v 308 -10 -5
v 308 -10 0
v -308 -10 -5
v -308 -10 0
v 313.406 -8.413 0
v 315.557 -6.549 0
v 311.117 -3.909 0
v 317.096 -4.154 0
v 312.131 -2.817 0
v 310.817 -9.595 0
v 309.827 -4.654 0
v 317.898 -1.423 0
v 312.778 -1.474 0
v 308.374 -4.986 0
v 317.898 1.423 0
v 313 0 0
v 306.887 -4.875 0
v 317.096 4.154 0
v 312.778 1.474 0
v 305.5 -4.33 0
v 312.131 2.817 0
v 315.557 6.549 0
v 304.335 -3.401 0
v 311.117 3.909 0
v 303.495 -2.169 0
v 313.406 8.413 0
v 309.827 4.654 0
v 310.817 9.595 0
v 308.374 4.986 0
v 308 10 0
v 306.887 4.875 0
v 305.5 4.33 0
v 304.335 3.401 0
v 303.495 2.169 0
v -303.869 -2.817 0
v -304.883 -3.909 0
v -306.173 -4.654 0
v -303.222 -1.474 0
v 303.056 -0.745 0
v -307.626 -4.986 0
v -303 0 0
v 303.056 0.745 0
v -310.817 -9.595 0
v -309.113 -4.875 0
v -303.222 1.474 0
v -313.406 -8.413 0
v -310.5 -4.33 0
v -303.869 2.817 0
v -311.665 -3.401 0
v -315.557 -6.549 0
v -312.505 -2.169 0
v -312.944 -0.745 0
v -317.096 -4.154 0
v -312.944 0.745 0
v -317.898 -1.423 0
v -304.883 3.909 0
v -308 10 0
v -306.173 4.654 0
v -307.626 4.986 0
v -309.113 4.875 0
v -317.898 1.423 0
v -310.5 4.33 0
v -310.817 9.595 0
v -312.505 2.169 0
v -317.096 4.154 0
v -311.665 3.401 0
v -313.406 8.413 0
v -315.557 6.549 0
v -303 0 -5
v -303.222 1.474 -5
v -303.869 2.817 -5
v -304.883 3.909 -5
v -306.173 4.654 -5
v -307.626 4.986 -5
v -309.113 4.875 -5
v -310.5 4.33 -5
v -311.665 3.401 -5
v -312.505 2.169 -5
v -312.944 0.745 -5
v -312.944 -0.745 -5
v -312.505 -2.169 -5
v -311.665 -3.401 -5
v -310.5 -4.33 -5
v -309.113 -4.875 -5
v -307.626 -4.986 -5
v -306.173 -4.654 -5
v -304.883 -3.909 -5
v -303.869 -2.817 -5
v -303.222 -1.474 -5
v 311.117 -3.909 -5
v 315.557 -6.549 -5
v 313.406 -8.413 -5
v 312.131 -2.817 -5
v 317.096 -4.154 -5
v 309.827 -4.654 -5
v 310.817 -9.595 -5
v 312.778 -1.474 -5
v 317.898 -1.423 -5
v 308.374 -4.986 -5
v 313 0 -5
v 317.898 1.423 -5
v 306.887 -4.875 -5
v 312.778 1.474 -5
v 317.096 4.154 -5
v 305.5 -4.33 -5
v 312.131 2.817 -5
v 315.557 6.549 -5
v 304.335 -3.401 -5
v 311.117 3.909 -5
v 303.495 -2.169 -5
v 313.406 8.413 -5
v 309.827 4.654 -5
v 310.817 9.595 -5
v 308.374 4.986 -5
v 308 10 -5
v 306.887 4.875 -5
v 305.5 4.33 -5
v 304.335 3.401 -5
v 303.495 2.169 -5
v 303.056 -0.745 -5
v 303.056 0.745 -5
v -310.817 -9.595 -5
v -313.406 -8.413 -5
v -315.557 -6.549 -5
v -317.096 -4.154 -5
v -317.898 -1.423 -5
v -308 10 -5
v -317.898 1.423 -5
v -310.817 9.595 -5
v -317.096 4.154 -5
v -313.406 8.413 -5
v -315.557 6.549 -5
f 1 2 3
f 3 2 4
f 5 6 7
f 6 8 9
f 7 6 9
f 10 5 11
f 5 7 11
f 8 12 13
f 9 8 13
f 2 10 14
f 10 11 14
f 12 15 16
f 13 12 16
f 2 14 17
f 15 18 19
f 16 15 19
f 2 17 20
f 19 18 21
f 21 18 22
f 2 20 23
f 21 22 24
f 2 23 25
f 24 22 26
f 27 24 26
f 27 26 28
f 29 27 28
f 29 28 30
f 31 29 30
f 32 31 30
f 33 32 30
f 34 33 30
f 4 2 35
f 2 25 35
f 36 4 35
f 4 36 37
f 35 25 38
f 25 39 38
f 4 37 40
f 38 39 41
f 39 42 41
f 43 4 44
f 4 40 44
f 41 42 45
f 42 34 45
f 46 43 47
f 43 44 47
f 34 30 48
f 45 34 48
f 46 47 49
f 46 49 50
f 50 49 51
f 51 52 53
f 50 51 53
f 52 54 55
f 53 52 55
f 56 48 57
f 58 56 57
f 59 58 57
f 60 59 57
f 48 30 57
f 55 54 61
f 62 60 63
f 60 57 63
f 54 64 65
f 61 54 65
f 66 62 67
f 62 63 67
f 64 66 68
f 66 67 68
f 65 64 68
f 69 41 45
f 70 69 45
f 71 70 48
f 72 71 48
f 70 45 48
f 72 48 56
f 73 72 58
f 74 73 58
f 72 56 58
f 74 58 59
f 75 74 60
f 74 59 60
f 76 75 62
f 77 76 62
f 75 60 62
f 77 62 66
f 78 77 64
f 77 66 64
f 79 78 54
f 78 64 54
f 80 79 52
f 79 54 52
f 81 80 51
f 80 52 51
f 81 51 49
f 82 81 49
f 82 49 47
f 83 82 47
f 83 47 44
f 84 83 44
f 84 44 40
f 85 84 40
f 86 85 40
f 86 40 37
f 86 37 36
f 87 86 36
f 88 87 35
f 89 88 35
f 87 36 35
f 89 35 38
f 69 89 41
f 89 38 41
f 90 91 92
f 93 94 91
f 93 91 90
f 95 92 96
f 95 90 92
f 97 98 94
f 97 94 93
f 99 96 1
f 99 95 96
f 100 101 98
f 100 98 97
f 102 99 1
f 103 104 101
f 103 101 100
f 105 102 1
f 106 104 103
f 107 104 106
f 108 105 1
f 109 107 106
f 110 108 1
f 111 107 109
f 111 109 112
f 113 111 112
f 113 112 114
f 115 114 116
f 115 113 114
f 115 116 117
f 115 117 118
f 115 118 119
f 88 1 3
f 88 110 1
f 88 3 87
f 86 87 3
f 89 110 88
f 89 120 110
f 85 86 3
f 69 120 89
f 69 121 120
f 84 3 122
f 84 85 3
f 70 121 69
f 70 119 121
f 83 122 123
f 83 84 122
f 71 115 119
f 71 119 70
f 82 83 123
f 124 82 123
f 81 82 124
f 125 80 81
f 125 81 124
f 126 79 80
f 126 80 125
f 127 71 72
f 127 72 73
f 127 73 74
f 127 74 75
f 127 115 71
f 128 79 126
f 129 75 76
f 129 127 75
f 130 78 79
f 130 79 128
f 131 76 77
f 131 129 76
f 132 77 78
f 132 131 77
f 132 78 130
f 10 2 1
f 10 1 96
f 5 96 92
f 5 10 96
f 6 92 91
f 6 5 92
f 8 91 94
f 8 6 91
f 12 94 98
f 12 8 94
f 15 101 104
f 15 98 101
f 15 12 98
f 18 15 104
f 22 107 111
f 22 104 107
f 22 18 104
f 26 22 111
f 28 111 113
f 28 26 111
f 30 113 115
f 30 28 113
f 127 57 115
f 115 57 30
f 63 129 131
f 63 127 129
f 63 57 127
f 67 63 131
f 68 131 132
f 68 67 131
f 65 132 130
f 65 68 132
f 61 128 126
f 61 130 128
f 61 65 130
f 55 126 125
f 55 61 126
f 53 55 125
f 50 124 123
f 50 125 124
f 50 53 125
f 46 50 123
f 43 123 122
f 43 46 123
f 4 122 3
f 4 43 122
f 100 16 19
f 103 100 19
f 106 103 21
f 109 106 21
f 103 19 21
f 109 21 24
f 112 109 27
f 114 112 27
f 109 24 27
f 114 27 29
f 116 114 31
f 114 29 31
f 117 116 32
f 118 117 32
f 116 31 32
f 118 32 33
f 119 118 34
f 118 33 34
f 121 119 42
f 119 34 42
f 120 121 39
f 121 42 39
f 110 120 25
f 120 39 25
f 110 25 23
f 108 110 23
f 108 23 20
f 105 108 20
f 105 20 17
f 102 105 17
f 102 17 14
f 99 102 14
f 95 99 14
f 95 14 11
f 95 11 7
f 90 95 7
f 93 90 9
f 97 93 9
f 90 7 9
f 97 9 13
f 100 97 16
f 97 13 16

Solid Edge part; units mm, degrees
sketch "Sketch1" plane through (0, 0, 0) normal (0, 0, 1) x (1, 0, 0)
  line L0 (-308, 10) -> (308, 10)
  line L1 (308, -10) -> (-308, -10)
  arc A0 (-308, -10) -> (-308, 10) centre (-308, 0) cw
  arc A1 (308, 10) -> (308, -10) centre (308, 0) cw
  circle A2 centre (-308, 0) radius 5
  circle A3 centre (308, 0) radius 5
  dimension "D1" = 616
  dimension "D2" = 20
extrude "Protrusion1" add sketch "Sketch1" against normal blind 5
